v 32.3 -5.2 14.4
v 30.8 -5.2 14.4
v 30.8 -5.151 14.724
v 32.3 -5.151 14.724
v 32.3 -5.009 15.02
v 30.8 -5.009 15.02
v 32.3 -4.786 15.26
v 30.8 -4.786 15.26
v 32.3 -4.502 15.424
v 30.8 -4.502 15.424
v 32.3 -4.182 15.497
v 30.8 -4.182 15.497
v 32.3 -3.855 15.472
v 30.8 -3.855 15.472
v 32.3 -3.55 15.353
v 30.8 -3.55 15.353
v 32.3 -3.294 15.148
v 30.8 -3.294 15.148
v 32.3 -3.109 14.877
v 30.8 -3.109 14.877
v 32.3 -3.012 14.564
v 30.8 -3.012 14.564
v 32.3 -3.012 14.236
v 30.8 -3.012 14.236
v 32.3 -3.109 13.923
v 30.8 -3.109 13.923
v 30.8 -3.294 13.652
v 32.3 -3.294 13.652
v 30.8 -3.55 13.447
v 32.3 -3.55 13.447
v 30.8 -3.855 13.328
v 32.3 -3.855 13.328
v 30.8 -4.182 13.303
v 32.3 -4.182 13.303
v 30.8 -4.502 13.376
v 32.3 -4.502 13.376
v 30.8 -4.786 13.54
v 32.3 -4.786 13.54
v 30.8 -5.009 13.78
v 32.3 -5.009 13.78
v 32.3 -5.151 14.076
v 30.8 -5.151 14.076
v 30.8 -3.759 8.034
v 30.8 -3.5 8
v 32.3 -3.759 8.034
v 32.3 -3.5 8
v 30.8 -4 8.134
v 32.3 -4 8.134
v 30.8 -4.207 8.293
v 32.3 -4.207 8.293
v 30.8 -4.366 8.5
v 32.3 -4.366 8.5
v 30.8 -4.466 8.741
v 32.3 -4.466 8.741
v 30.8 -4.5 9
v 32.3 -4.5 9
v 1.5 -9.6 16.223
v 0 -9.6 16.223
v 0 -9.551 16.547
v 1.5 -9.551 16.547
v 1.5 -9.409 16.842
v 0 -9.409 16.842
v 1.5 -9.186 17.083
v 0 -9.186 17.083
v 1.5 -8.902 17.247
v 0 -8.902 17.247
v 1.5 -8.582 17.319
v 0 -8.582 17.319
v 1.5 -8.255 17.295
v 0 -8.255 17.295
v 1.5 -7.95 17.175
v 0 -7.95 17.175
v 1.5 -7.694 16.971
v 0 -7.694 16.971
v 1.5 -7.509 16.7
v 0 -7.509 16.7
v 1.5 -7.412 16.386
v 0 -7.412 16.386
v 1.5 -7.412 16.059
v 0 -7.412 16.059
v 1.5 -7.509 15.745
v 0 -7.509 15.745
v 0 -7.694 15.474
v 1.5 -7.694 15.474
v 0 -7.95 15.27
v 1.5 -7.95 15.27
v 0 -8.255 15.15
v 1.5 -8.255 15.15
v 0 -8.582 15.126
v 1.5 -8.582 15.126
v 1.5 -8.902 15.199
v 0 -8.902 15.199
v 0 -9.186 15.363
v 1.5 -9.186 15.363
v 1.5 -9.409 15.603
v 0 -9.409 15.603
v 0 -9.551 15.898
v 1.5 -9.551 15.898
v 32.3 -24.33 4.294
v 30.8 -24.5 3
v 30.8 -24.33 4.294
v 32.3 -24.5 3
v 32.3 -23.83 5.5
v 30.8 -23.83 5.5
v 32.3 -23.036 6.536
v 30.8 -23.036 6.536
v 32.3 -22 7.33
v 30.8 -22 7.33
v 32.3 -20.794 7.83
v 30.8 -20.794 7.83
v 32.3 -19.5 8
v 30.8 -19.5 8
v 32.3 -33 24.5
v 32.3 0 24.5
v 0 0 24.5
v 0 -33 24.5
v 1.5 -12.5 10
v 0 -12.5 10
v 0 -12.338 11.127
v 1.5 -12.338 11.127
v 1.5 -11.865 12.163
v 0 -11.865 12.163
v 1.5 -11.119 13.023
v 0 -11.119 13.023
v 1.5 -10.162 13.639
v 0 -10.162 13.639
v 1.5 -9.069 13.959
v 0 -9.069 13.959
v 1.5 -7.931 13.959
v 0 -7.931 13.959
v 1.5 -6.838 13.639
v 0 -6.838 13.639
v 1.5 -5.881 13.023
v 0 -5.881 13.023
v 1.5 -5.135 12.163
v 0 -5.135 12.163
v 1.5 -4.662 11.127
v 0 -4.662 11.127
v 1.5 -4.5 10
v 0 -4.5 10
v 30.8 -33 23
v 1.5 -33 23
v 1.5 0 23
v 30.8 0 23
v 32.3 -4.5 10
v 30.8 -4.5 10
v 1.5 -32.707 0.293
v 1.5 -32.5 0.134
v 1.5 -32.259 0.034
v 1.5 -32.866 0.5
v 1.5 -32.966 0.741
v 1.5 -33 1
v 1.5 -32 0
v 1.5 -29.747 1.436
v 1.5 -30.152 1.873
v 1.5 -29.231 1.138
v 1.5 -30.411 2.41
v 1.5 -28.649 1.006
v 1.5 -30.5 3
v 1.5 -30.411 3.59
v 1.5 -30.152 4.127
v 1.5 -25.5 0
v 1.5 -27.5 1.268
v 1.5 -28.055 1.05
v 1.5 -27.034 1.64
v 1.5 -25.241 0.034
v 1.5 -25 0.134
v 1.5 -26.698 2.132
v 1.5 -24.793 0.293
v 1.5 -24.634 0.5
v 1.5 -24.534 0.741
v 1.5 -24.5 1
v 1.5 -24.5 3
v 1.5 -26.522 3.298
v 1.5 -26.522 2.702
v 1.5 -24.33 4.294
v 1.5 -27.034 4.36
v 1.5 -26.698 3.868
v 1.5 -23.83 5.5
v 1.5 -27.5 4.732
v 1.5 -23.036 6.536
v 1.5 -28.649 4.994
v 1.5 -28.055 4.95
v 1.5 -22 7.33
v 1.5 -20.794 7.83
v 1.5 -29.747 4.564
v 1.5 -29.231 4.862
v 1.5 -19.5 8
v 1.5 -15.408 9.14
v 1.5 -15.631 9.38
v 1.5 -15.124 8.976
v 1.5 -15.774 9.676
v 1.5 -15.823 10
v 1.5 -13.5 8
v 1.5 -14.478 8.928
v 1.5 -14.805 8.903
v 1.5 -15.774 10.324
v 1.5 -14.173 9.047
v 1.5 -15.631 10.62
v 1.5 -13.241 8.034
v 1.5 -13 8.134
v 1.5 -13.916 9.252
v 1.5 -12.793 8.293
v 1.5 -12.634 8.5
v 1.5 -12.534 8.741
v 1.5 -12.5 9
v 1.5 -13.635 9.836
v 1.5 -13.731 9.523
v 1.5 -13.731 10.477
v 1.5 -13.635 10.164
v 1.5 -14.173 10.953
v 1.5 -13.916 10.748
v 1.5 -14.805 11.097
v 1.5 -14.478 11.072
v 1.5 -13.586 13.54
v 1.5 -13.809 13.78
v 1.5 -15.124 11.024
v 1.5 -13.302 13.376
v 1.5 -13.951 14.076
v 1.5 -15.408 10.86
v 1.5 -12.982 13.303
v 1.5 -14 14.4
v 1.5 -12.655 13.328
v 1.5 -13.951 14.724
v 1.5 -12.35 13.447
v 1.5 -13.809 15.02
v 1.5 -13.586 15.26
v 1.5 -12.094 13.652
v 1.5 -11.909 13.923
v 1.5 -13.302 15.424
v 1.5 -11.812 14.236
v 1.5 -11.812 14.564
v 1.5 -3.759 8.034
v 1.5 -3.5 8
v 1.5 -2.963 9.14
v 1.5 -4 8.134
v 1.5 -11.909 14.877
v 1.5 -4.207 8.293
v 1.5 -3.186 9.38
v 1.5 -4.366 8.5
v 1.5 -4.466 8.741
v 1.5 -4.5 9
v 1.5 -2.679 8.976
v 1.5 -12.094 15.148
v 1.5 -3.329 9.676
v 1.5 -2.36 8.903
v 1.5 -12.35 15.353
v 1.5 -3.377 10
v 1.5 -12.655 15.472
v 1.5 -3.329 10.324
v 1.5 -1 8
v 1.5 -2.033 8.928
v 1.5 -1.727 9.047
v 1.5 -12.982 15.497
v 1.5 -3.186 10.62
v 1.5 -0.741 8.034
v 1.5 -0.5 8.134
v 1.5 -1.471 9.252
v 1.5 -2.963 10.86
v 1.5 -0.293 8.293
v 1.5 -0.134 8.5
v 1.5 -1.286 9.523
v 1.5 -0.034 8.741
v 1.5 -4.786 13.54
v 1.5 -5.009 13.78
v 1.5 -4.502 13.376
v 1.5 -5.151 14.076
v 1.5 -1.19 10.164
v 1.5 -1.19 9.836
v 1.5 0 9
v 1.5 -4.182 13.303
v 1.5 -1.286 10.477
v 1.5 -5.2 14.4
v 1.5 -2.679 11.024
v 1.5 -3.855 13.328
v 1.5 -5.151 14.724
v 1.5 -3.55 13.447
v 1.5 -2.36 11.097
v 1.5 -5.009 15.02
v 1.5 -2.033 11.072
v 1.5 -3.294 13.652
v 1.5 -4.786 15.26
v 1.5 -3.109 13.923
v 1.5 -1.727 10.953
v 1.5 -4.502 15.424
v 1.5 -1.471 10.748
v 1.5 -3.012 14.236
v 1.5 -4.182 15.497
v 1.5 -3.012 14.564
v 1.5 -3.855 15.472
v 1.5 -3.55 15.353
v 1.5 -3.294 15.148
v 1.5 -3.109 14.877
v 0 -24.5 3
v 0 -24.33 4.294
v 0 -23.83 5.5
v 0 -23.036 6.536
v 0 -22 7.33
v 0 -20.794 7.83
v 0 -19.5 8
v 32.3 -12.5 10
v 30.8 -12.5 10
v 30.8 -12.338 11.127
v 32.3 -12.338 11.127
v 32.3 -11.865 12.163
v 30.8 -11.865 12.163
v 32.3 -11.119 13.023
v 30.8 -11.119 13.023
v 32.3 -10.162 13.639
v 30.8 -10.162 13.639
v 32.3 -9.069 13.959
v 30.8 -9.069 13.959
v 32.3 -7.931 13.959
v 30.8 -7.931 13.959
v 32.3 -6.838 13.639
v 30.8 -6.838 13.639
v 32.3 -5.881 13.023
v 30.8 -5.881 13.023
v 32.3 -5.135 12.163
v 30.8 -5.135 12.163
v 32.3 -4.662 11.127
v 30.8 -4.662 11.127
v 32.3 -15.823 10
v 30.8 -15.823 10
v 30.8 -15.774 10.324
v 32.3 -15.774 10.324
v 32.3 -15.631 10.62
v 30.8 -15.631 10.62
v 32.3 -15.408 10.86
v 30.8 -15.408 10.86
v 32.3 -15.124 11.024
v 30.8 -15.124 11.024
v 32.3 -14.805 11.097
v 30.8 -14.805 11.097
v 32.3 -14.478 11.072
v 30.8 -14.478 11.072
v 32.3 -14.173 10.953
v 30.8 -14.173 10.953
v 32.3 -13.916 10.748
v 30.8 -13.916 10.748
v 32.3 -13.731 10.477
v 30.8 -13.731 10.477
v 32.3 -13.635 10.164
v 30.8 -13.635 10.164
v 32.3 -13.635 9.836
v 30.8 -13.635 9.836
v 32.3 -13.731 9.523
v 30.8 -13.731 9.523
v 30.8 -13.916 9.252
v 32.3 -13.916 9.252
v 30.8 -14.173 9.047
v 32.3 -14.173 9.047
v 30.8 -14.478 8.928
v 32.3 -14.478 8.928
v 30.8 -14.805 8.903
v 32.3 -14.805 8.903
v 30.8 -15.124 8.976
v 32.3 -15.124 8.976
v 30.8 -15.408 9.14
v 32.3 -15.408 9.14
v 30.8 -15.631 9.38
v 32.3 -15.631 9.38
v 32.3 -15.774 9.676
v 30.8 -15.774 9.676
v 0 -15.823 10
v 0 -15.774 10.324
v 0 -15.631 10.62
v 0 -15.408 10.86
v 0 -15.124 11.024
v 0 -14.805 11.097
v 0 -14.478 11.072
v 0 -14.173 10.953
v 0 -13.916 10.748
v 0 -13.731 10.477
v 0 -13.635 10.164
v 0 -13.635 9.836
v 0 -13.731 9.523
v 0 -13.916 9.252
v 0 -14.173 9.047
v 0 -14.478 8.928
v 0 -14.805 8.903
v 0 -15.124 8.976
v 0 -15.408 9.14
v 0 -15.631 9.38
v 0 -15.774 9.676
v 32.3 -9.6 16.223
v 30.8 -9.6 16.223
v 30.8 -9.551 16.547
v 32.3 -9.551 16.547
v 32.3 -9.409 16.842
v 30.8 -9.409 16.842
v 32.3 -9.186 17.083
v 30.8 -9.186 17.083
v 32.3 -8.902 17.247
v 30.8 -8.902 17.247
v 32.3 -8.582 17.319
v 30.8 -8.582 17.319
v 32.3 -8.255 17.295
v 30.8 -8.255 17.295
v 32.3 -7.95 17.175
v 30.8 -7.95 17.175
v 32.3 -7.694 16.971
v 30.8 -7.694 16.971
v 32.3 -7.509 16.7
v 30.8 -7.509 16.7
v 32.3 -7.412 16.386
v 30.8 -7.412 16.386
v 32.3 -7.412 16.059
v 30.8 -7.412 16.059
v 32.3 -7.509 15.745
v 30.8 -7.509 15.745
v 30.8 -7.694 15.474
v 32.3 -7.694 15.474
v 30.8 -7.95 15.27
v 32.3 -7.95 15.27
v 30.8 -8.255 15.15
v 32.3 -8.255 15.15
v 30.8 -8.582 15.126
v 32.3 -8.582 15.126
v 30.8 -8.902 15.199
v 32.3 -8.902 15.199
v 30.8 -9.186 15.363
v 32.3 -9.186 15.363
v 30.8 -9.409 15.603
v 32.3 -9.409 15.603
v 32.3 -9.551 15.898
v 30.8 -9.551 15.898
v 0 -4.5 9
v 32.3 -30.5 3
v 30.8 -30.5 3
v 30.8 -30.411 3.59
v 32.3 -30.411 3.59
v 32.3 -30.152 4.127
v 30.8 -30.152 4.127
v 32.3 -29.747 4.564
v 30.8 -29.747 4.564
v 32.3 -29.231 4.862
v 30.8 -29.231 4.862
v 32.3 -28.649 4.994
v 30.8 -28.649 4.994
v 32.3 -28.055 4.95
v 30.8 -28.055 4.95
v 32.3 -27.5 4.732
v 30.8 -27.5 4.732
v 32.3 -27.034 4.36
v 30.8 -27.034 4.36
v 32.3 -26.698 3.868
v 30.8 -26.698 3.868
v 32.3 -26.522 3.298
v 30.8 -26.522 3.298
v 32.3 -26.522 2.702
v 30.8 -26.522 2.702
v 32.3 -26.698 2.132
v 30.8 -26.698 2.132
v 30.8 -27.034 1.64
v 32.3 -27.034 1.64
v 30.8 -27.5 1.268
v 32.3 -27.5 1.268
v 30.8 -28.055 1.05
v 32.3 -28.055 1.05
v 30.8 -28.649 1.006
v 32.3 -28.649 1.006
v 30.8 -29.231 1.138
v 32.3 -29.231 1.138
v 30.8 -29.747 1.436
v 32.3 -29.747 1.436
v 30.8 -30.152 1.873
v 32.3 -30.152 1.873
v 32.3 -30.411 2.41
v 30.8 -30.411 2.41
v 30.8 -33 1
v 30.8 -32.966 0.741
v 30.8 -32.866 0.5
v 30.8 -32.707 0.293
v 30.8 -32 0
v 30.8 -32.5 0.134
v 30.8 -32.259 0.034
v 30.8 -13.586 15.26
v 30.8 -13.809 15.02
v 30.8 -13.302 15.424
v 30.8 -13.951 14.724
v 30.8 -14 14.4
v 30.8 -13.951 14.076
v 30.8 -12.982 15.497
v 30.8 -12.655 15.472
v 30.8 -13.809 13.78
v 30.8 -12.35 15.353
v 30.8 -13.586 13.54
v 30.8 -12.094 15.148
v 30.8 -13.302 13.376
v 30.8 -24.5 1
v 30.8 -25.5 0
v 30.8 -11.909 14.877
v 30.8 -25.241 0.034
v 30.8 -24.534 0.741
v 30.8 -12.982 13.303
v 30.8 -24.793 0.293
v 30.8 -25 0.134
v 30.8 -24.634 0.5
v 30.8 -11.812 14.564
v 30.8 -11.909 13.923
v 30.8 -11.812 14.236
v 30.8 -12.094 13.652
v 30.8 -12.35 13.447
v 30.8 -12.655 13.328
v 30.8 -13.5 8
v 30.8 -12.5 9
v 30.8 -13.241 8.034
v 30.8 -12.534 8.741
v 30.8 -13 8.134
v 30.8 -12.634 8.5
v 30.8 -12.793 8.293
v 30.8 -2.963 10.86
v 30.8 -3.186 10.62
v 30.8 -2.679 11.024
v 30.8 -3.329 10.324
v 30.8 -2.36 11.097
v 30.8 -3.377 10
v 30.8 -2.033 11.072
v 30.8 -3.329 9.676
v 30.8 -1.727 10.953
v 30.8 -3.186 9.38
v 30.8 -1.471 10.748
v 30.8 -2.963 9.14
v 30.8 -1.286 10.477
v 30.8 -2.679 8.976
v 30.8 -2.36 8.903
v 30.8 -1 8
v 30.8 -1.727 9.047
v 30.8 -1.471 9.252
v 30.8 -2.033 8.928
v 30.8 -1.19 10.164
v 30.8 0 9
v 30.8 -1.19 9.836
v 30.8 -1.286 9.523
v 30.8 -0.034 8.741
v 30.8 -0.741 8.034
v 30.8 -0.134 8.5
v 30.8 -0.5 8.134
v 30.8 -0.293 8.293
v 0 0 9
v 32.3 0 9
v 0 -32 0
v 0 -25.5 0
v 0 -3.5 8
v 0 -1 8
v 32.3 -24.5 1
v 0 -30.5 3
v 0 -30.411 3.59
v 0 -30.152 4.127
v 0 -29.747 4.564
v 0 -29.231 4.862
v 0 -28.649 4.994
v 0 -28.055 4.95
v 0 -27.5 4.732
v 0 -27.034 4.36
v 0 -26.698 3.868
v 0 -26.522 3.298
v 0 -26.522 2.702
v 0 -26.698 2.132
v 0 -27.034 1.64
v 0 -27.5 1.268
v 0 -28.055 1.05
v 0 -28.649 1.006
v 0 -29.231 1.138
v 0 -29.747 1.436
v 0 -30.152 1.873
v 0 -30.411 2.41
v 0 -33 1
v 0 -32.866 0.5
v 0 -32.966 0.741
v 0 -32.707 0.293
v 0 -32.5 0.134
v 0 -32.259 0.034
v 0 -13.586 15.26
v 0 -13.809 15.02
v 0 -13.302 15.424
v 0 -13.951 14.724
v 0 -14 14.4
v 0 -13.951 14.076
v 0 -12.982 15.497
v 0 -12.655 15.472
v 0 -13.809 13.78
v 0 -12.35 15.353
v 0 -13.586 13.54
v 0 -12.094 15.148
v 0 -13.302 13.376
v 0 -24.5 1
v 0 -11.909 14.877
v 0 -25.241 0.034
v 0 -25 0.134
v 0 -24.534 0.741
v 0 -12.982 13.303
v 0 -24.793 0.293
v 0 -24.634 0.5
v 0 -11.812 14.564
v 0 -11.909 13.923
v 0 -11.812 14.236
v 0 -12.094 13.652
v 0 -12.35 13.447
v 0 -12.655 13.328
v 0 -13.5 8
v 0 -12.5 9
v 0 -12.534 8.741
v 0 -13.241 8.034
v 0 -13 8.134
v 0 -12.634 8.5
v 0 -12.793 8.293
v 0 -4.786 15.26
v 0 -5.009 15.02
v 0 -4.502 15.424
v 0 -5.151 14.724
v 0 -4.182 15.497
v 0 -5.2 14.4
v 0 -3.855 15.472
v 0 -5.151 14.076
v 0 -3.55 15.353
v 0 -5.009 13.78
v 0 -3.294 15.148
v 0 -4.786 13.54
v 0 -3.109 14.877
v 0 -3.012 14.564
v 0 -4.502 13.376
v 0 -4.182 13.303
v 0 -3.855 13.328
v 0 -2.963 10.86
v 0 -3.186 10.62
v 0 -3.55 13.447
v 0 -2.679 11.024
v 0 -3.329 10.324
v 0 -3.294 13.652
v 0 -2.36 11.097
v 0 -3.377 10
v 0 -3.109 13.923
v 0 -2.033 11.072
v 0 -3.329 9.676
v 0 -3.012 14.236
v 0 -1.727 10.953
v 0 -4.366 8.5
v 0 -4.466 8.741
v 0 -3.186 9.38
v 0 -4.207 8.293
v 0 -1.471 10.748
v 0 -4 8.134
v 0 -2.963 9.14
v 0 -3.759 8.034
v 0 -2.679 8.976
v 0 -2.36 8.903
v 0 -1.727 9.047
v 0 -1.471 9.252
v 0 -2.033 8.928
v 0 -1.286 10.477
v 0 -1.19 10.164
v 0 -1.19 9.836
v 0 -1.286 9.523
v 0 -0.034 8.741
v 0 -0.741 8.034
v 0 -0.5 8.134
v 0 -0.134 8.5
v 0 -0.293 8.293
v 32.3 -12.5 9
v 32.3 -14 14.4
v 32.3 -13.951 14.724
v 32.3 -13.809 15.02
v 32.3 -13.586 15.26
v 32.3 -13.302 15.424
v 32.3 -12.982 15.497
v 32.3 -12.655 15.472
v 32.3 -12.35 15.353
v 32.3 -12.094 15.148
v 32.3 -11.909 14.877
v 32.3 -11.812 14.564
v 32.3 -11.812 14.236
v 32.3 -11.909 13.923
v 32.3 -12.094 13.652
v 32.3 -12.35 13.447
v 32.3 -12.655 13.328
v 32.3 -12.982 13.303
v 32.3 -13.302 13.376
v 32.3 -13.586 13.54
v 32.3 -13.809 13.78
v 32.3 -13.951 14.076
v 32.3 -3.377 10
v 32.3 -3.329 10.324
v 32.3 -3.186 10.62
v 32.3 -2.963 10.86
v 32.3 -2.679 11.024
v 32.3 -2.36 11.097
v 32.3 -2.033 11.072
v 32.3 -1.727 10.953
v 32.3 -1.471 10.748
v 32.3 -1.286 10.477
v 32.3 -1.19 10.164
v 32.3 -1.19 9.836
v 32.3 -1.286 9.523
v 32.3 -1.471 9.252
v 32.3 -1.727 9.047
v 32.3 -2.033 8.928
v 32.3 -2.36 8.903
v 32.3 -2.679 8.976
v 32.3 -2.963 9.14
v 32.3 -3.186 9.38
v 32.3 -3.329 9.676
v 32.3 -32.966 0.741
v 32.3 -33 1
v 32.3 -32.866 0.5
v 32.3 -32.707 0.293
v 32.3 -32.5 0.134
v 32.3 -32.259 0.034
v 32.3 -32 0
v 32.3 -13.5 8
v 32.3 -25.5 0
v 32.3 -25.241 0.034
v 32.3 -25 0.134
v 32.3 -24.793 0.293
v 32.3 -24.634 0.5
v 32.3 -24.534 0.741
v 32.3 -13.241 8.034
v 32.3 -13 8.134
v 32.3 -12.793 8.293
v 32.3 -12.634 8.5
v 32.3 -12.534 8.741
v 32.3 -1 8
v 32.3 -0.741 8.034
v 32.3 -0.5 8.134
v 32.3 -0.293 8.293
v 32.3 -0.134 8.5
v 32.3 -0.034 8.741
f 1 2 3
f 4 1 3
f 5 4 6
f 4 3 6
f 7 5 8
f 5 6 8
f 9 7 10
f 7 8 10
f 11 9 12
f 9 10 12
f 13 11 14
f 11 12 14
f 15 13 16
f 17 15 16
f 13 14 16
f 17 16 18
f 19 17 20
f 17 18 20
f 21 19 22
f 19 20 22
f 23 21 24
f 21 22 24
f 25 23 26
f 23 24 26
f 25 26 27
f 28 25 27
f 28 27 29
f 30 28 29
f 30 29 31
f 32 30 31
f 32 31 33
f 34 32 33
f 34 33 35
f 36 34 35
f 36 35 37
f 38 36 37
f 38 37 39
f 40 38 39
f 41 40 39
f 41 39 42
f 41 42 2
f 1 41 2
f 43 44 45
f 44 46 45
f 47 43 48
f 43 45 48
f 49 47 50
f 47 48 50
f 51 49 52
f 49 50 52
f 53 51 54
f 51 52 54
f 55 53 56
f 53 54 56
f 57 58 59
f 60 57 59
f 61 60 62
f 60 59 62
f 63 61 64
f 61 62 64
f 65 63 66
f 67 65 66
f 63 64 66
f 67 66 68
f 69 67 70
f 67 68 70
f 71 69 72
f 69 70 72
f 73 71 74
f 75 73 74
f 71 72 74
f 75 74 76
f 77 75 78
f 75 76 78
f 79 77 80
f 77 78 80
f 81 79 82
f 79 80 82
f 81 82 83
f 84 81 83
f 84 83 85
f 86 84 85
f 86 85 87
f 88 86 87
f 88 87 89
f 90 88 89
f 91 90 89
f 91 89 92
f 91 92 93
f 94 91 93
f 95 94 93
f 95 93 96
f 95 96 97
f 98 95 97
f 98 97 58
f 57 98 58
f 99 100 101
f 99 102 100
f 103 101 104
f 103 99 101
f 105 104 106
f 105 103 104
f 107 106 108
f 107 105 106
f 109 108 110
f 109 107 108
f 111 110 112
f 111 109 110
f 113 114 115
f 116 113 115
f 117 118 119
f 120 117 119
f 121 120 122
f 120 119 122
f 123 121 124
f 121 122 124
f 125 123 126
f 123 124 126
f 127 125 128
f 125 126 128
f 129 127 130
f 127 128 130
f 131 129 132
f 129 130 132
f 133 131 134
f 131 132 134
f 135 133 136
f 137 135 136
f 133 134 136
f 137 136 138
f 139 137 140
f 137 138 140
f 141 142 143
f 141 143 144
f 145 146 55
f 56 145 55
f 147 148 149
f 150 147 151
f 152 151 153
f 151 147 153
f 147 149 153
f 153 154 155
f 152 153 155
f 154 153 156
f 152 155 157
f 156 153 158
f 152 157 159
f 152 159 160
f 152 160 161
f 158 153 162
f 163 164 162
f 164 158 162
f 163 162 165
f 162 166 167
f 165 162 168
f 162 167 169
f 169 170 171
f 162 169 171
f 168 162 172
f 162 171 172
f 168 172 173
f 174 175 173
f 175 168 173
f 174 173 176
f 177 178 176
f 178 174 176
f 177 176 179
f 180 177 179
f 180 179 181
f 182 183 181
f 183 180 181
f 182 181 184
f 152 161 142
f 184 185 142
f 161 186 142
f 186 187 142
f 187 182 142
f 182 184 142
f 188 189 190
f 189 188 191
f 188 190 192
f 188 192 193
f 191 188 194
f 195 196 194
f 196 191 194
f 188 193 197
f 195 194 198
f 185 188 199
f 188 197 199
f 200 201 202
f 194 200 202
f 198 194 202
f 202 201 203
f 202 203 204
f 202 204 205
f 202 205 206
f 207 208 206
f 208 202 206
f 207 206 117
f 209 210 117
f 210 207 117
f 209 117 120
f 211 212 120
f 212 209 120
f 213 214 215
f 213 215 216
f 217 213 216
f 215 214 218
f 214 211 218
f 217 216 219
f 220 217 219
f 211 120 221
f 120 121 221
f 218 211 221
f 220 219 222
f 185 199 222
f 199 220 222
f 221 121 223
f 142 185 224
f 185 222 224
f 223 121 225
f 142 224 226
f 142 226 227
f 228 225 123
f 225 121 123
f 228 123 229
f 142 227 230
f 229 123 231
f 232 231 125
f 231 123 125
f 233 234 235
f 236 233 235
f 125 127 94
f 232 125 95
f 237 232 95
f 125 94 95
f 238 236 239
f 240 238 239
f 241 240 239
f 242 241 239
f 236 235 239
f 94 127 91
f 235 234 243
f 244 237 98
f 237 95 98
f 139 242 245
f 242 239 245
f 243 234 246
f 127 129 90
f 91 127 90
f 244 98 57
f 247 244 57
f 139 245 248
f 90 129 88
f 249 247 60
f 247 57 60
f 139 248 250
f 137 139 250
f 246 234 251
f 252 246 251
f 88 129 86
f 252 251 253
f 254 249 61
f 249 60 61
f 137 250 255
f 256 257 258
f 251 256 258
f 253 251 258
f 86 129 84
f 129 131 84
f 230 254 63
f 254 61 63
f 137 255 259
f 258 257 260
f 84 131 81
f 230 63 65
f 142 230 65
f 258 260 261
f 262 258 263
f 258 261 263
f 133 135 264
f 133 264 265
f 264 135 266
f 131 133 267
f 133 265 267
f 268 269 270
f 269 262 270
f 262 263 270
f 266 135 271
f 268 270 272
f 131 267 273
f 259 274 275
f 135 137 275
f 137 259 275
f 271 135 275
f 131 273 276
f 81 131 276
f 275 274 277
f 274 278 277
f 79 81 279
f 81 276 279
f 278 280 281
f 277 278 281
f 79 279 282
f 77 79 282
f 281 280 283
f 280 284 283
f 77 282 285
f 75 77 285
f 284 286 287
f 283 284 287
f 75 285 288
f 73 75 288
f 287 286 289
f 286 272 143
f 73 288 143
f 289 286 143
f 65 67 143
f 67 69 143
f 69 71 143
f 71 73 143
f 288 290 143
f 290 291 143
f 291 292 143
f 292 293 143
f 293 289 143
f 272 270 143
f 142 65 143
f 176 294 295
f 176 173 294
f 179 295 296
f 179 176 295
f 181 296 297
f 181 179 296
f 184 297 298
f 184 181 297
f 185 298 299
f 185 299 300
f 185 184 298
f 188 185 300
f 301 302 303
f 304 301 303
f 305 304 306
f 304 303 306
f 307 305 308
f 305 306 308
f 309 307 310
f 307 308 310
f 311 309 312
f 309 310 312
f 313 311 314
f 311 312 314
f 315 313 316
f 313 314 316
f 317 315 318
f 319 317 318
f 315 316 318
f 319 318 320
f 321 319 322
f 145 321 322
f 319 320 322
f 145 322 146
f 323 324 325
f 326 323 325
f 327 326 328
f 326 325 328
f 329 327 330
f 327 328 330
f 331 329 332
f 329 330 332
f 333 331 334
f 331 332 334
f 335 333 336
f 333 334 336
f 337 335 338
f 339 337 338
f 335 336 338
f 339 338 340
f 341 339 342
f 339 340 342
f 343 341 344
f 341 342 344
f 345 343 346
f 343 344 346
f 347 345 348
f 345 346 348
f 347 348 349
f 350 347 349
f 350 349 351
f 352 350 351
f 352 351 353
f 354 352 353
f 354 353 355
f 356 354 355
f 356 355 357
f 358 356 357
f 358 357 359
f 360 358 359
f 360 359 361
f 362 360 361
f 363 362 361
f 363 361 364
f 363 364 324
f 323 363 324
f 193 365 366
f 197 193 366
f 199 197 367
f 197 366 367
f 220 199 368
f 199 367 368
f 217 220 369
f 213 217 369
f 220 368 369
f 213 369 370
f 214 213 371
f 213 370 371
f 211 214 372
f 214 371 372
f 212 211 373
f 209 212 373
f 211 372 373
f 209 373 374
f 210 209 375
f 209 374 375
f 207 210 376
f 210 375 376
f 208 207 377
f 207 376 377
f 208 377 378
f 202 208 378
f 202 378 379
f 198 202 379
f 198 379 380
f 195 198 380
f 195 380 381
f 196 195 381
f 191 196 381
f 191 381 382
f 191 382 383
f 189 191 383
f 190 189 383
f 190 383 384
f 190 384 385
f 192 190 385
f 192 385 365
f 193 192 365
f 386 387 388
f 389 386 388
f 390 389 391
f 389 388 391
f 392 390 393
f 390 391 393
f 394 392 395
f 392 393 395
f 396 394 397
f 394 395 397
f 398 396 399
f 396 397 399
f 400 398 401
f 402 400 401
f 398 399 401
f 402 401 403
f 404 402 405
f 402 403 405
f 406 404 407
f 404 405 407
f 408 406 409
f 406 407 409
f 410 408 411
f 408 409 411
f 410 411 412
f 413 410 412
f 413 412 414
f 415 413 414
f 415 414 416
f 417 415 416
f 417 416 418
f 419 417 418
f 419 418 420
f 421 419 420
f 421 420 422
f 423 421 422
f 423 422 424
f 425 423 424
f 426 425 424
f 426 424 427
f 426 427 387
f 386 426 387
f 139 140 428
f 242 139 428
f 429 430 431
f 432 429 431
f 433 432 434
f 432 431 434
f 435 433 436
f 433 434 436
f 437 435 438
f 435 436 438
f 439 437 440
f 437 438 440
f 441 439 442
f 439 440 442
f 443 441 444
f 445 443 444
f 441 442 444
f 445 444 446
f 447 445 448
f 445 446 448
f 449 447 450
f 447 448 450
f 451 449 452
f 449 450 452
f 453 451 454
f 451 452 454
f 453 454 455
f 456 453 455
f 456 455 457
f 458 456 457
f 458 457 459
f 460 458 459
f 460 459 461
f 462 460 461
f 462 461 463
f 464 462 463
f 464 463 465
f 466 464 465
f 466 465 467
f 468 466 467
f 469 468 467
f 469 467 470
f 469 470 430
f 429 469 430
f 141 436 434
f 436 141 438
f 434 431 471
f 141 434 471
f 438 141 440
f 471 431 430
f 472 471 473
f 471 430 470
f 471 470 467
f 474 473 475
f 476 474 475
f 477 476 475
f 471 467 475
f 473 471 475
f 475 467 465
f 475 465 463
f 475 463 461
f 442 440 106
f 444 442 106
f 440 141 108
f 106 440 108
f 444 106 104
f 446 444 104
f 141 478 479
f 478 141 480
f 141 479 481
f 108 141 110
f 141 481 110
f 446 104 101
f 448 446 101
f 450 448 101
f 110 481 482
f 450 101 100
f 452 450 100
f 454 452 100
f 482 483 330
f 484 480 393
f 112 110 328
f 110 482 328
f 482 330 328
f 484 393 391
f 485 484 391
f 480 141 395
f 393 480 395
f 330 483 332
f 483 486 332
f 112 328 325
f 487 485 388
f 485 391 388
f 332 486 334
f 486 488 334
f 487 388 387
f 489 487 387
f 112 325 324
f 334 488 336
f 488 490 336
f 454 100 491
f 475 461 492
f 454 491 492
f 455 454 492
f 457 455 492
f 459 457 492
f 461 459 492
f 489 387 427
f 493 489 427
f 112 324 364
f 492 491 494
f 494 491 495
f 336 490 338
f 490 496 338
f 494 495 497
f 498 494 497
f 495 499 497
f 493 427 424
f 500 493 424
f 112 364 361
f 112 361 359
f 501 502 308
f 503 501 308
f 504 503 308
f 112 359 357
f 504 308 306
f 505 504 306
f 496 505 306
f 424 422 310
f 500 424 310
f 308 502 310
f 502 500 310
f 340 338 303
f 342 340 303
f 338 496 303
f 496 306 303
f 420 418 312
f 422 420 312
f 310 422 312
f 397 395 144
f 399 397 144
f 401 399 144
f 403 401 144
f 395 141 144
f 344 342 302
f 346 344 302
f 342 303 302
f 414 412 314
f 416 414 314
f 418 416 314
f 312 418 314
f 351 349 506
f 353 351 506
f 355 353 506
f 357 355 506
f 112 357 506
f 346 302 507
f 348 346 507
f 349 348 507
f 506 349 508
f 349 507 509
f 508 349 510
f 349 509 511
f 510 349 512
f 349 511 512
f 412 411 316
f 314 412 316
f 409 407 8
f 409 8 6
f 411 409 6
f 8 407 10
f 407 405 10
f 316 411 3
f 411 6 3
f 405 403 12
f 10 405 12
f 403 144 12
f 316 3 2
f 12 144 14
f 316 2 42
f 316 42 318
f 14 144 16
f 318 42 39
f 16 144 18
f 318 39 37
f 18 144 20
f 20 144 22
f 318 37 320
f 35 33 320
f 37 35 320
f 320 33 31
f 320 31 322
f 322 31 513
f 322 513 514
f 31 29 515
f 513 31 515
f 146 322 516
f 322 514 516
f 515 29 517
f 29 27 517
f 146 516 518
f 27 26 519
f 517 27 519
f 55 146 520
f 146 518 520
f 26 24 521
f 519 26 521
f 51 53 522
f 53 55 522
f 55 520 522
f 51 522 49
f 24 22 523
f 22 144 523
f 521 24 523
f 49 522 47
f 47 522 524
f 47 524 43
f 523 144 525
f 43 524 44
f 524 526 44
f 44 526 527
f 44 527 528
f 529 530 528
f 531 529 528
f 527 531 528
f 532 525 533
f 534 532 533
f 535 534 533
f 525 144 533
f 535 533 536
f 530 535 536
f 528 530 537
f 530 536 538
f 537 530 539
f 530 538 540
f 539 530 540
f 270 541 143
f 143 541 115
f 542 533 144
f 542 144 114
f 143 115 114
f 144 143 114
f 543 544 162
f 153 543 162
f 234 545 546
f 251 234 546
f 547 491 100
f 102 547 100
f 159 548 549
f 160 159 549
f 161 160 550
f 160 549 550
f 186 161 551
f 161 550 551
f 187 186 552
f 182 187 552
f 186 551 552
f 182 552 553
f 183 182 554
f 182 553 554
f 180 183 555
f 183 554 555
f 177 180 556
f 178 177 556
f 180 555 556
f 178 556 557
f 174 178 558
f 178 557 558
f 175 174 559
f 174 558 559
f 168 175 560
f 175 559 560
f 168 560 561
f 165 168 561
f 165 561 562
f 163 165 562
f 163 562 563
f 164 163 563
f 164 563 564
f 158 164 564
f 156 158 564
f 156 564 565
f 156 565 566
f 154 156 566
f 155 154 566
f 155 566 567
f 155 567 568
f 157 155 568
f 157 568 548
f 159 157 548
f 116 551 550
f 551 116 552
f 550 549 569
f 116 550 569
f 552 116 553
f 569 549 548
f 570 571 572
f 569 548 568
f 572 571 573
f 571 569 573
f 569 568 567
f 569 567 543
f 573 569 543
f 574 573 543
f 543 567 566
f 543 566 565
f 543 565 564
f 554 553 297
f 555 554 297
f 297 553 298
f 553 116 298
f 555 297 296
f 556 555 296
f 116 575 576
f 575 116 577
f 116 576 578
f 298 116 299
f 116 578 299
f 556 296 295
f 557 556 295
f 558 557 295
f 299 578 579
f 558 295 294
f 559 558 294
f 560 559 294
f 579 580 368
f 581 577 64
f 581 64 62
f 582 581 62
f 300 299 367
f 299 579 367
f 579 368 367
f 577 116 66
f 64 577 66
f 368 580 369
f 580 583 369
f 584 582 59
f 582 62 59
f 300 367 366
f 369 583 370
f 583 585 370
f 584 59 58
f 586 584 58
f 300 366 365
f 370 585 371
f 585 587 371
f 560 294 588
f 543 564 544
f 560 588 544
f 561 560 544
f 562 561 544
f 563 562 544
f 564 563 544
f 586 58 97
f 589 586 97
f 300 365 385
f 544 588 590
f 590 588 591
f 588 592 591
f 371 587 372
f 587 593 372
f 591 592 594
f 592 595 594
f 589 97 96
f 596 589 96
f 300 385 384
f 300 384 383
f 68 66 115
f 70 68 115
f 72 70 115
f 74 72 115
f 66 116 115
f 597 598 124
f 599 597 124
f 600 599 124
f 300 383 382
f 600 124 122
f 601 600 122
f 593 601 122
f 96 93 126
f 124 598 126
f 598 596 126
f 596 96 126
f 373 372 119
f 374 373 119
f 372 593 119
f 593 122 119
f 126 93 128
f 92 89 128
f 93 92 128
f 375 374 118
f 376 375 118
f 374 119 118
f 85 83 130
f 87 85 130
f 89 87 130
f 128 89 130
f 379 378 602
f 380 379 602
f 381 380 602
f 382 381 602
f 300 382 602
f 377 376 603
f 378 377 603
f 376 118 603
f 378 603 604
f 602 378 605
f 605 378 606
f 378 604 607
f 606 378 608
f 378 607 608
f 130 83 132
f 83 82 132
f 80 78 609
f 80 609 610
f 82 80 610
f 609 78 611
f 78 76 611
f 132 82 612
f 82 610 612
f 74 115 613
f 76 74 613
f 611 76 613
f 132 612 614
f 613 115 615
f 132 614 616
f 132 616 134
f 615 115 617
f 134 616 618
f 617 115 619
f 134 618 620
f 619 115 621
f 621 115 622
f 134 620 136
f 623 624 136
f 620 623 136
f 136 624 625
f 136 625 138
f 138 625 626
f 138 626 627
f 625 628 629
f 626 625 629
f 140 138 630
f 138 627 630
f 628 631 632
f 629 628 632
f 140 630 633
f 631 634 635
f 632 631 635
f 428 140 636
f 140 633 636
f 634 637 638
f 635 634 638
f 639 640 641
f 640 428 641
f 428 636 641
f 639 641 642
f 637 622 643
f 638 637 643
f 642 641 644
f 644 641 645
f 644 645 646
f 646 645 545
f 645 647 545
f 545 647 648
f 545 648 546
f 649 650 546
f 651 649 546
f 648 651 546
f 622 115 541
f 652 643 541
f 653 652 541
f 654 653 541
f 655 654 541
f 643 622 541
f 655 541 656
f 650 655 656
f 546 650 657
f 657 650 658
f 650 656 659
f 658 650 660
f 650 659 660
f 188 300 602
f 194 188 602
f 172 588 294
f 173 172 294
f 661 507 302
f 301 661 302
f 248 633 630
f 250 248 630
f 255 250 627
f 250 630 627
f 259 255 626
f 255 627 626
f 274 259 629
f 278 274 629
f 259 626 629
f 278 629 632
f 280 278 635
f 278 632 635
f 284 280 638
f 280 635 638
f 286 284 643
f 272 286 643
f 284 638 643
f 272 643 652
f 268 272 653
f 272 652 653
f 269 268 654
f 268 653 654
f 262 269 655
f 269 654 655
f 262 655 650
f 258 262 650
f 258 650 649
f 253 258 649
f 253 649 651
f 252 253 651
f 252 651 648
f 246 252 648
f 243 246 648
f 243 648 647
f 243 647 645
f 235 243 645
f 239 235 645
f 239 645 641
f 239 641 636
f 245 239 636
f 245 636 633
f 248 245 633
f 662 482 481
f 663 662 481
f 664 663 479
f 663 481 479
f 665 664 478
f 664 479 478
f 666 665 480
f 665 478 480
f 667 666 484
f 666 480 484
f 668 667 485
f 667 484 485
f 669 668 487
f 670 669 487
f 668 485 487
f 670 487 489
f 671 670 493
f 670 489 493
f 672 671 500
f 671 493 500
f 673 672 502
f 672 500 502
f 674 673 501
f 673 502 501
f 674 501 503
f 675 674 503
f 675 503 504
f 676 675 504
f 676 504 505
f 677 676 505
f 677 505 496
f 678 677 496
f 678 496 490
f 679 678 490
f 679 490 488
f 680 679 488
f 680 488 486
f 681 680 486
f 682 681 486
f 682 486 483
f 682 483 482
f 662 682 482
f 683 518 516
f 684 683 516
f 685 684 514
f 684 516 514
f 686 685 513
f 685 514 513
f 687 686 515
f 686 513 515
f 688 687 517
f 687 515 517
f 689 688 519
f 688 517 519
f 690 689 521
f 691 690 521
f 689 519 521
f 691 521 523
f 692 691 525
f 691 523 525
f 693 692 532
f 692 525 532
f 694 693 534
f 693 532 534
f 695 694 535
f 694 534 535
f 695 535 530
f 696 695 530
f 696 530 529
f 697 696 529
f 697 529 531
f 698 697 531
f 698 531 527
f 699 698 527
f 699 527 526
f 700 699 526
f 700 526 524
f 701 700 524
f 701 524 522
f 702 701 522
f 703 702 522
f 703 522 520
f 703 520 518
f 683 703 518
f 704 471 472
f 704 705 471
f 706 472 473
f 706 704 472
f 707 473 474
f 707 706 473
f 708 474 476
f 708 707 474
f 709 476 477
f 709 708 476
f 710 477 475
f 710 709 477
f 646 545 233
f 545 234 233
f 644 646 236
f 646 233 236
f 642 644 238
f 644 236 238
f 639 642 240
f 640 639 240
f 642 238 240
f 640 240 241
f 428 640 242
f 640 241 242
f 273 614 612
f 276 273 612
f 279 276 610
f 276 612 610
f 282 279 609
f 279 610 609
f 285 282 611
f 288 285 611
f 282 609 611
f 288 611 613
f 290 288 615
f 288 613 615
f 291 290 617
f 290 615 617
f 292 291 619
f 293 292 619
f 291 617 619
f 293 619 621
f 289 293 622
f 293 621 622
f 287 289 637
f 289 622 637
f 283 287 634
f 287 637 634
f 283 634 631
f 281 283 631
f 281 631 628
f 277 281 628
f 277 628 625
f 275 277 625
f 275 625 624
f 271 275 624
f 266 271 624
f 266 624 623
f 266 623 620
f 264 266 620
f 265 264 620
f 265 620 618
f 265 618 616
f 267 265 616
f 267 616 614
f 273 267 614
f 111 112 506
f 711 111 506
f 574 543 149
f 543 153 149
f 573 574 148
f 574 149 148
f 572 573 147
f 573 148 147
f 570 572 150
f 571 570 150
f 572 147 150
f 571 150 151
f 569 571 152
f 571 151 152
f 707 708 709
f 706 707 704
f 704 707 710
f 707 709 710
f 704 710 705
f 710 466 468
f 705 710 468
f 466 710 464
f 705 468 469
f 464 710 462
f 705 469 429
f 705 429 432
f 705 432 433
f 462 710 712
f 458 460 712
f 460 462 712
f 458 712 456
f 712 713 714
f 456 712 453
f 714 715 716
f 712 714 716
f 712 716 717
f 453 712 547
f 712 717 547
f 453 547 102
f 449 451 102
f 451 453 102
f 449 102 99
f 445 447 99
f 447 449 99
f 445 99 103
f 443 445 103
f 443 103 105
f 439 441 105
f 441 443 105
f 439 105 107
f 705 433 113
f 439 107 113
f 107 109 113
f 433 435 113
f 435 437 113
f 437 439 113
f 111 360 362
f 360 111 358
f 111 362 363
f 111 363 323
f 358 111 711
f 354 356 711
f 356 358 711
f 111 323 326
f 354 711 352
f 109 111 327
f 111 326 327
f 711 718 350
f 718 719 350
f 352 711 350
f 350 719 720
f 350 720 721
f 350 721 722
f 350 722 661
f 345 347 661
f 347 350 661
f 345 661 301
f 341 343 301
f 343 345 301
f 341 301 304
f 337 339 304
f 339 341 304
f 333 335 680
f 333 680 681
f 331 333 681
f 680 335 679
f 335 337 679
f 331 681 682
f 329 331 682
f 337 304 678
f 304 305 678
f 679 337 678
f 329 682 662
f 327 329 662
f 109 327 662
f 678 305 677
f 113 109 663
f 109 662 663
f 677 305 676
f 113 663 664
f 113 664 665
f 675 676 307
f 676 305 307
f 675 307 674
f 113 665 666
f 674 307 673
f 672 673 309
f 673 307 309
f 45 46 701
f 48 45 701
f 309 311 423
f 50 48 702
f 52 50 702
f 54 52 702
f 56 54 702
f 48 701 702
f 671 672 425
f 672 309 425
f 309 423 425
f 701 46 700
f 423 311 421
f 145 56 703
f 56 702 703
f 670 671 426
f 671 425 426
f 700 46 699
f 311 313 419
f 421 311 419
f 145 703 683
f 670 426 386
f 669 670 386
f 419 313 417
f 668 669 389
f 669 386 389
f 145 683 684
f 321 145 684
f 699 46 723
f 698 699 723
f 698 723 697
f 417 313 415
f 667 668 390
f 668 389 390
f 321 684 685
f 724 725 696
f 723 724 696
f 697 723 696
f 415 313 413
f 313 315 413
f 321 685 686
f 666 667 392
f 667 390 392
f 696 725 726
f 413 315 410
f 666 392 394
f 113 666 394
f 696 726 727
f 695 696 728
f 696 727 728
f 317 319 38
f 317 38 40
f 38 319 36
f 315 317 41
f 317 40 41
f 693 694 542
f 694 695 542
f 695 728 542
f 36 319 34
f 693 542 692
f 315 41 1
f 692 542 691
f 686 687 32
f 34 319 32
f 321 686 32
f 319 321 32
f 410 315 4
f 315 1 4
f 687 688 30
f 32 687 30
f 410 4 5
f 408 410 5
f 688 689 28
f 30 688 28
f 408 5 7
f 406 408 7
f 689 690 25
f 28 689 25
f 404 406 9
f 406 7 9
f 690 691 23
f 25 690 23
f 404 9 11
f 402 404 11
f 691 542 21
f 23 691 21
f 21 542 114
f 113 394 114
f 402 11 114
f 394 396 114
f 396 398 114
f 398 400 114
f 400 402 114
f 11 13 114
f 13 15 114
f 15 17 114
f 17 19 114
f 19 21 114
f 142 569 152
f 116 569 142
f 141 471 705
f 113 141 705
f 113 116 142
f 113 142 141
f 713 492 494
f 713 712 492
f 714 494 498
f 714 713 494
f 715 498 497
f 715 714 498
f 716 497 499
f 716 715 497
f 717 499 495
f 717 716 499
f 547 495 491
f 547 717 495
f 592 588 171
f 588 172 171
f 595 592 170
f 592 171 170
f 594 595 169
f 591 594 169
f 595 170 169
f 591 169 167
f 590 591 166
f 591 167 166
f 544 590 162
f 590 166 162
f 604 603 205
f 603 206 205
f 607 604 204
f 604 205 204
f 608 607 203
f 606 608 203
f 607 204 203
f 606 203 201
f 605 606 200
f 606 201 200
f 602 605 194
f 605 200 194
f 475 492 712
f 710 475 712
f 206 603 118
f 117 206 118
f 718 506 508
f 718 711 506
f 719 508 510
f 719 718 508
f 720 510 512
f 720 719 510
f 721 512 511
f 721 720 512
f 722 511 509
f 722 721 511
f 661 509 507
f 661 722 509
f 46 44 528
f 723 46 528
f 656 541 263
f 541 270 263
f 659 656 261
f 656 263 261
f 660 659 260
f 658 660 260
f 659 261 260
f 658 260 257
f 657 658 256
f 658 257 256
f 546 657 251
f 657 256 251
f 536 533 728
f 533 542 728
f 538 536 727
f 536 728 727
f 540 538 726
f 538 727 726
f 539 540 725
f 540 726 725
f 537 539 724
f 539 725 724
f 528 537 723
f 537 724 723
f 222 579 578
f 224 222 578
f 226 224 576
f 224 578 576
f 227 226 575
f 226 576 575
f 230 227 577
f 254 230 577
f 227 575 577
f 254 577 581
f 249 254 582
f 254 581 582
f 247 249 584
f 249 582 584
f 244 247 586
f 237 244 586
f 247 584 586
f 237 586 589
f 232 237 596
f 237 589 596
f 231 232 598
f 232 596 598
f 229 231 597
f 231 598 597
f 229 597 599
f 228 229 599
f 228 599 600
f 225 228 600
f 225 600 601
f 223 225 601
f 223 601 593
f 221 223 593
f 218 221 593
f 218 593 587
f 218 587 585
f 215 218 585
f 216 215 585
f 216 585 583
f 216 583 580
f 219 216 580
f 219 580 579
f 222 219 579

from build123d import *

# Parameters (mm, degrees)
F1_DEPTH = 33
F2_R     = 1.1
F2_R_2   = 2
F3_DEPTH = 32.301
F4_R     = 1
F5_R     = 5


with BuildPart() as f1:
    # F0 (on Front) → F1 (new body)
    with BuildSketch(Plane.XZ):
        Polygon((0, 24.5), (0, 0), (1.5, 0), (1.5, 23), (30.8, 23), (30.8, 0), (32.3, 0), (32.3, 24.5), align=None)
    extrude(amount=F1_DEPTH)

    # F2 (on face) → F3 (cut, through all)
    with BuildSketch(Plane(origin=(0, 0, 0), x_dir=(0, -1, 0), z_dir=(-1, 0, 0))):
        with BuildLine():
            Line((0, 8), (0, 0))
            Line((0, 0), (24.5, 0))
            Line((24.5, 0), (24.5, 8))
            Line((24.5, 8), (12.5, 8))
            Line((12.5, 8), (12.5, 10))
            ThreePointArc((12.5, 10), (8.5, 14), (4.5, 10))
            Line((4.5, 10), (4.5, 8))
            Line((4.5, 8), (0, 8))
        make_face()
        with Locations((14.7225396744, 10)):
            Circle(F2_R)
        with Locations((12.9, 14.4)):
            Circle(F2_R)
        with Locations((8.5, 16.2225396744)):
            Circle(F2_R)
        with Locations((4.1, 14.4)):
            Circle(F2_R)
        with Locations((2.2774603256, 10)):
            Circle(F2_R)
        with Locations((28.5, 3)):
            Circle(F2_R_2)
    extrude(amount=-F3_DEPTH, mode=Mode.SUBTRACT)

    # F4
    f4_edges = [f1.edges().sort_by_distance(p)[0] for p in [
        (0.75, -4.5, 8),
        (31.55, -4.5, 8),
        (0.75, -12.5, 8),
        (31.55, -12.5, 8),
        (31.55, 0, 8),
        (0.75, 0, 8),
        (0.75, -24.5, 0),
        (31.55, -24.5, 0),
        (0.75, -33, 0),
        (31.55, -33, 0),
    ]]
    fillet(f4_edges, radius=F4_R)

    # F5
    f5_edges = [f1.edges().sort_by_distance(p)[0] for p in [
        (0.75, -24.5, 8),
        (31.55, -24.5, 8),
    ]]
    fillet(f5_edges, radius=F5_R)


solid = f1.part
